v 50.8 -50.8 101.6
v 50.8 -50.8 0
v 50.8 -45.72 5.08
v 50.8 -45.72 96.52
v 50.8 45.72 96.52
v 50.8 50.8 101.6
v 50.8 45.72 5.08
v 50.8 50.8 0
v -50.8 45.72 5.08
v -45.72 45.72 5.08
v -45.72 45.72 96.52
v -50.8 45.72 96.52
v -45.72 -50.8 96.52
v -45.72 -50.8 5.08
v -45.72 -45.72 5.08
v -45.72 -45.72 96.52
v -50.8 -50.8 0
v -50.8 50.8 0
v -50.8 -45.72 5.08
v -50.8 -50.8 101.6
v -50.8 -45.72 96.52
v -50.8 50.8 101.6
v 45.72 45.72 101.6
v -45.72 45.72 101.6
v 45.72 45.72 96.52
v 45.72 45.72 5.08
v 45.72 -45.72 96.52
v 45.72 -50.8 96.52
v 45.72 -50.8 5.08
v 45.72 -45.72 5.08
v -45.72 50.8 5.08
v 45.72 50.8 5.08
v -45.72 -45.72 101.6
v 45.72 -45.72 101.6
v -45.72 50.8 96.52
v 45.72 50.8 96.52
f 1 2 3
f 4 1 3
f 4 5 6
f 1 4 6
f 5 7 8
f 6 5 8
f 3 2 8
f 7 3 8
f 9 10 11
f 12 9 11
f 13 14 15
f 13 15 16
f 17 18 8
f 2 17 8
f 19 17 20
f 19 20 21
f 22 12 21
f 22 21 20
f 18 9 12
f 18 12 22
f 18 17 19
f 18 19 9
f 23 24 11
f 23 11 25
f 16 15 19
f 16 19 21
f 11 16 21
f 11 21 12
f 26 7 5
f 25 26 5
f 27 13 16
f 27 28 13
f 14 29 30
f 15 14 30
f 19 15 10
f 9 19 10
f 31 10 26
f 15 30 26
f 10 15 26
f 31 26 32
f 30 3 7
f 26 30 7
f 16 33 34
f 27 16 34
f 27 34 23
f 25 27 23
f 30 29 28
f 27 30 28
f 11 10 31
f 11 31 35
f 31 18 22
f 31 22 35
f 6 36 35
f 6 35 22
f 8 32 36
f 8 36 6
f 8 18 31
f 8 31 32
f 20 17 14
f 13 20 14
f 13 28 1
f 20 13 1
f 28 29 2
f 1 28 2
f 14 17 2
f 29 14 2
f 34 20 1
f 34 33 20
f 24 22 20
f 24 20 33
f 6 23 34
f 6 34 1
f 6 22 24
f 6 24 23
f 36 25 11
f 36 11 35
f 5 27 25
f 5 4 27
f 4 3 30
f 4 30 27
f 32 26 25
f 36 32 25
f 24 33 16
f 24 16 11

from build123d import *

# Parameters (mm, degrees)
F0_W     = 101.6
F0_H     = 101.6
F0_W_2   = 91.44
F0_H_2   = 91.44
F1_DEPTH = 101.6
F2_W     = 91.44
F2_H     = 91.44
F3_DEPTH = 101.6
F4_W     = 91.44
F4_H     = 91.44
F5_DEPTH = 101.6
F6_W     = 91.44
F6_H     = 91.44
F7_DEPTH = 25.4


with BuildPart() as f1:
    # F0 (on Top) → F1 (new body)
    with BuildSketch(Plane.XY):
        Rectangle(F0_W, F0_H)
        Rectangle(F0_W_2, F0_H_2, mode=Mode.SUBTRACT)
        Rectangle(F0_W_2, F0_H_2)
    extrude(amount=F1_DEPTH)

    # F2 (on face) → F3 (cut)
    with BuildSketch(Plane.YZ.offset(50.8)):
        with Locations((0, 50.8)):
            Rectangle(F2_W, F2_H)
    extrude(amount=-F3_DEPTH, mode=Mode.SUBTRACT)

    # F4 (on face) → F5 (cut)
    with BuildSketch(Plane.XZ.offset(50.8)):
        with Locations((0, 50.8)):
            Rectangle(F4_W, F4_H)
    extrude(amount=-F5_DEPTH, mode=Mode.SUBTRACT)

    # F6 (on face) → F7 (cut)
    with BuildSketch(Plane.XY.offset(101.6)):
        Rectangle(F6_W, F6_H)
    extrude(amount=-F7_DEPTH, mode=Mode.SUBTRACT)


solid = f1.part
